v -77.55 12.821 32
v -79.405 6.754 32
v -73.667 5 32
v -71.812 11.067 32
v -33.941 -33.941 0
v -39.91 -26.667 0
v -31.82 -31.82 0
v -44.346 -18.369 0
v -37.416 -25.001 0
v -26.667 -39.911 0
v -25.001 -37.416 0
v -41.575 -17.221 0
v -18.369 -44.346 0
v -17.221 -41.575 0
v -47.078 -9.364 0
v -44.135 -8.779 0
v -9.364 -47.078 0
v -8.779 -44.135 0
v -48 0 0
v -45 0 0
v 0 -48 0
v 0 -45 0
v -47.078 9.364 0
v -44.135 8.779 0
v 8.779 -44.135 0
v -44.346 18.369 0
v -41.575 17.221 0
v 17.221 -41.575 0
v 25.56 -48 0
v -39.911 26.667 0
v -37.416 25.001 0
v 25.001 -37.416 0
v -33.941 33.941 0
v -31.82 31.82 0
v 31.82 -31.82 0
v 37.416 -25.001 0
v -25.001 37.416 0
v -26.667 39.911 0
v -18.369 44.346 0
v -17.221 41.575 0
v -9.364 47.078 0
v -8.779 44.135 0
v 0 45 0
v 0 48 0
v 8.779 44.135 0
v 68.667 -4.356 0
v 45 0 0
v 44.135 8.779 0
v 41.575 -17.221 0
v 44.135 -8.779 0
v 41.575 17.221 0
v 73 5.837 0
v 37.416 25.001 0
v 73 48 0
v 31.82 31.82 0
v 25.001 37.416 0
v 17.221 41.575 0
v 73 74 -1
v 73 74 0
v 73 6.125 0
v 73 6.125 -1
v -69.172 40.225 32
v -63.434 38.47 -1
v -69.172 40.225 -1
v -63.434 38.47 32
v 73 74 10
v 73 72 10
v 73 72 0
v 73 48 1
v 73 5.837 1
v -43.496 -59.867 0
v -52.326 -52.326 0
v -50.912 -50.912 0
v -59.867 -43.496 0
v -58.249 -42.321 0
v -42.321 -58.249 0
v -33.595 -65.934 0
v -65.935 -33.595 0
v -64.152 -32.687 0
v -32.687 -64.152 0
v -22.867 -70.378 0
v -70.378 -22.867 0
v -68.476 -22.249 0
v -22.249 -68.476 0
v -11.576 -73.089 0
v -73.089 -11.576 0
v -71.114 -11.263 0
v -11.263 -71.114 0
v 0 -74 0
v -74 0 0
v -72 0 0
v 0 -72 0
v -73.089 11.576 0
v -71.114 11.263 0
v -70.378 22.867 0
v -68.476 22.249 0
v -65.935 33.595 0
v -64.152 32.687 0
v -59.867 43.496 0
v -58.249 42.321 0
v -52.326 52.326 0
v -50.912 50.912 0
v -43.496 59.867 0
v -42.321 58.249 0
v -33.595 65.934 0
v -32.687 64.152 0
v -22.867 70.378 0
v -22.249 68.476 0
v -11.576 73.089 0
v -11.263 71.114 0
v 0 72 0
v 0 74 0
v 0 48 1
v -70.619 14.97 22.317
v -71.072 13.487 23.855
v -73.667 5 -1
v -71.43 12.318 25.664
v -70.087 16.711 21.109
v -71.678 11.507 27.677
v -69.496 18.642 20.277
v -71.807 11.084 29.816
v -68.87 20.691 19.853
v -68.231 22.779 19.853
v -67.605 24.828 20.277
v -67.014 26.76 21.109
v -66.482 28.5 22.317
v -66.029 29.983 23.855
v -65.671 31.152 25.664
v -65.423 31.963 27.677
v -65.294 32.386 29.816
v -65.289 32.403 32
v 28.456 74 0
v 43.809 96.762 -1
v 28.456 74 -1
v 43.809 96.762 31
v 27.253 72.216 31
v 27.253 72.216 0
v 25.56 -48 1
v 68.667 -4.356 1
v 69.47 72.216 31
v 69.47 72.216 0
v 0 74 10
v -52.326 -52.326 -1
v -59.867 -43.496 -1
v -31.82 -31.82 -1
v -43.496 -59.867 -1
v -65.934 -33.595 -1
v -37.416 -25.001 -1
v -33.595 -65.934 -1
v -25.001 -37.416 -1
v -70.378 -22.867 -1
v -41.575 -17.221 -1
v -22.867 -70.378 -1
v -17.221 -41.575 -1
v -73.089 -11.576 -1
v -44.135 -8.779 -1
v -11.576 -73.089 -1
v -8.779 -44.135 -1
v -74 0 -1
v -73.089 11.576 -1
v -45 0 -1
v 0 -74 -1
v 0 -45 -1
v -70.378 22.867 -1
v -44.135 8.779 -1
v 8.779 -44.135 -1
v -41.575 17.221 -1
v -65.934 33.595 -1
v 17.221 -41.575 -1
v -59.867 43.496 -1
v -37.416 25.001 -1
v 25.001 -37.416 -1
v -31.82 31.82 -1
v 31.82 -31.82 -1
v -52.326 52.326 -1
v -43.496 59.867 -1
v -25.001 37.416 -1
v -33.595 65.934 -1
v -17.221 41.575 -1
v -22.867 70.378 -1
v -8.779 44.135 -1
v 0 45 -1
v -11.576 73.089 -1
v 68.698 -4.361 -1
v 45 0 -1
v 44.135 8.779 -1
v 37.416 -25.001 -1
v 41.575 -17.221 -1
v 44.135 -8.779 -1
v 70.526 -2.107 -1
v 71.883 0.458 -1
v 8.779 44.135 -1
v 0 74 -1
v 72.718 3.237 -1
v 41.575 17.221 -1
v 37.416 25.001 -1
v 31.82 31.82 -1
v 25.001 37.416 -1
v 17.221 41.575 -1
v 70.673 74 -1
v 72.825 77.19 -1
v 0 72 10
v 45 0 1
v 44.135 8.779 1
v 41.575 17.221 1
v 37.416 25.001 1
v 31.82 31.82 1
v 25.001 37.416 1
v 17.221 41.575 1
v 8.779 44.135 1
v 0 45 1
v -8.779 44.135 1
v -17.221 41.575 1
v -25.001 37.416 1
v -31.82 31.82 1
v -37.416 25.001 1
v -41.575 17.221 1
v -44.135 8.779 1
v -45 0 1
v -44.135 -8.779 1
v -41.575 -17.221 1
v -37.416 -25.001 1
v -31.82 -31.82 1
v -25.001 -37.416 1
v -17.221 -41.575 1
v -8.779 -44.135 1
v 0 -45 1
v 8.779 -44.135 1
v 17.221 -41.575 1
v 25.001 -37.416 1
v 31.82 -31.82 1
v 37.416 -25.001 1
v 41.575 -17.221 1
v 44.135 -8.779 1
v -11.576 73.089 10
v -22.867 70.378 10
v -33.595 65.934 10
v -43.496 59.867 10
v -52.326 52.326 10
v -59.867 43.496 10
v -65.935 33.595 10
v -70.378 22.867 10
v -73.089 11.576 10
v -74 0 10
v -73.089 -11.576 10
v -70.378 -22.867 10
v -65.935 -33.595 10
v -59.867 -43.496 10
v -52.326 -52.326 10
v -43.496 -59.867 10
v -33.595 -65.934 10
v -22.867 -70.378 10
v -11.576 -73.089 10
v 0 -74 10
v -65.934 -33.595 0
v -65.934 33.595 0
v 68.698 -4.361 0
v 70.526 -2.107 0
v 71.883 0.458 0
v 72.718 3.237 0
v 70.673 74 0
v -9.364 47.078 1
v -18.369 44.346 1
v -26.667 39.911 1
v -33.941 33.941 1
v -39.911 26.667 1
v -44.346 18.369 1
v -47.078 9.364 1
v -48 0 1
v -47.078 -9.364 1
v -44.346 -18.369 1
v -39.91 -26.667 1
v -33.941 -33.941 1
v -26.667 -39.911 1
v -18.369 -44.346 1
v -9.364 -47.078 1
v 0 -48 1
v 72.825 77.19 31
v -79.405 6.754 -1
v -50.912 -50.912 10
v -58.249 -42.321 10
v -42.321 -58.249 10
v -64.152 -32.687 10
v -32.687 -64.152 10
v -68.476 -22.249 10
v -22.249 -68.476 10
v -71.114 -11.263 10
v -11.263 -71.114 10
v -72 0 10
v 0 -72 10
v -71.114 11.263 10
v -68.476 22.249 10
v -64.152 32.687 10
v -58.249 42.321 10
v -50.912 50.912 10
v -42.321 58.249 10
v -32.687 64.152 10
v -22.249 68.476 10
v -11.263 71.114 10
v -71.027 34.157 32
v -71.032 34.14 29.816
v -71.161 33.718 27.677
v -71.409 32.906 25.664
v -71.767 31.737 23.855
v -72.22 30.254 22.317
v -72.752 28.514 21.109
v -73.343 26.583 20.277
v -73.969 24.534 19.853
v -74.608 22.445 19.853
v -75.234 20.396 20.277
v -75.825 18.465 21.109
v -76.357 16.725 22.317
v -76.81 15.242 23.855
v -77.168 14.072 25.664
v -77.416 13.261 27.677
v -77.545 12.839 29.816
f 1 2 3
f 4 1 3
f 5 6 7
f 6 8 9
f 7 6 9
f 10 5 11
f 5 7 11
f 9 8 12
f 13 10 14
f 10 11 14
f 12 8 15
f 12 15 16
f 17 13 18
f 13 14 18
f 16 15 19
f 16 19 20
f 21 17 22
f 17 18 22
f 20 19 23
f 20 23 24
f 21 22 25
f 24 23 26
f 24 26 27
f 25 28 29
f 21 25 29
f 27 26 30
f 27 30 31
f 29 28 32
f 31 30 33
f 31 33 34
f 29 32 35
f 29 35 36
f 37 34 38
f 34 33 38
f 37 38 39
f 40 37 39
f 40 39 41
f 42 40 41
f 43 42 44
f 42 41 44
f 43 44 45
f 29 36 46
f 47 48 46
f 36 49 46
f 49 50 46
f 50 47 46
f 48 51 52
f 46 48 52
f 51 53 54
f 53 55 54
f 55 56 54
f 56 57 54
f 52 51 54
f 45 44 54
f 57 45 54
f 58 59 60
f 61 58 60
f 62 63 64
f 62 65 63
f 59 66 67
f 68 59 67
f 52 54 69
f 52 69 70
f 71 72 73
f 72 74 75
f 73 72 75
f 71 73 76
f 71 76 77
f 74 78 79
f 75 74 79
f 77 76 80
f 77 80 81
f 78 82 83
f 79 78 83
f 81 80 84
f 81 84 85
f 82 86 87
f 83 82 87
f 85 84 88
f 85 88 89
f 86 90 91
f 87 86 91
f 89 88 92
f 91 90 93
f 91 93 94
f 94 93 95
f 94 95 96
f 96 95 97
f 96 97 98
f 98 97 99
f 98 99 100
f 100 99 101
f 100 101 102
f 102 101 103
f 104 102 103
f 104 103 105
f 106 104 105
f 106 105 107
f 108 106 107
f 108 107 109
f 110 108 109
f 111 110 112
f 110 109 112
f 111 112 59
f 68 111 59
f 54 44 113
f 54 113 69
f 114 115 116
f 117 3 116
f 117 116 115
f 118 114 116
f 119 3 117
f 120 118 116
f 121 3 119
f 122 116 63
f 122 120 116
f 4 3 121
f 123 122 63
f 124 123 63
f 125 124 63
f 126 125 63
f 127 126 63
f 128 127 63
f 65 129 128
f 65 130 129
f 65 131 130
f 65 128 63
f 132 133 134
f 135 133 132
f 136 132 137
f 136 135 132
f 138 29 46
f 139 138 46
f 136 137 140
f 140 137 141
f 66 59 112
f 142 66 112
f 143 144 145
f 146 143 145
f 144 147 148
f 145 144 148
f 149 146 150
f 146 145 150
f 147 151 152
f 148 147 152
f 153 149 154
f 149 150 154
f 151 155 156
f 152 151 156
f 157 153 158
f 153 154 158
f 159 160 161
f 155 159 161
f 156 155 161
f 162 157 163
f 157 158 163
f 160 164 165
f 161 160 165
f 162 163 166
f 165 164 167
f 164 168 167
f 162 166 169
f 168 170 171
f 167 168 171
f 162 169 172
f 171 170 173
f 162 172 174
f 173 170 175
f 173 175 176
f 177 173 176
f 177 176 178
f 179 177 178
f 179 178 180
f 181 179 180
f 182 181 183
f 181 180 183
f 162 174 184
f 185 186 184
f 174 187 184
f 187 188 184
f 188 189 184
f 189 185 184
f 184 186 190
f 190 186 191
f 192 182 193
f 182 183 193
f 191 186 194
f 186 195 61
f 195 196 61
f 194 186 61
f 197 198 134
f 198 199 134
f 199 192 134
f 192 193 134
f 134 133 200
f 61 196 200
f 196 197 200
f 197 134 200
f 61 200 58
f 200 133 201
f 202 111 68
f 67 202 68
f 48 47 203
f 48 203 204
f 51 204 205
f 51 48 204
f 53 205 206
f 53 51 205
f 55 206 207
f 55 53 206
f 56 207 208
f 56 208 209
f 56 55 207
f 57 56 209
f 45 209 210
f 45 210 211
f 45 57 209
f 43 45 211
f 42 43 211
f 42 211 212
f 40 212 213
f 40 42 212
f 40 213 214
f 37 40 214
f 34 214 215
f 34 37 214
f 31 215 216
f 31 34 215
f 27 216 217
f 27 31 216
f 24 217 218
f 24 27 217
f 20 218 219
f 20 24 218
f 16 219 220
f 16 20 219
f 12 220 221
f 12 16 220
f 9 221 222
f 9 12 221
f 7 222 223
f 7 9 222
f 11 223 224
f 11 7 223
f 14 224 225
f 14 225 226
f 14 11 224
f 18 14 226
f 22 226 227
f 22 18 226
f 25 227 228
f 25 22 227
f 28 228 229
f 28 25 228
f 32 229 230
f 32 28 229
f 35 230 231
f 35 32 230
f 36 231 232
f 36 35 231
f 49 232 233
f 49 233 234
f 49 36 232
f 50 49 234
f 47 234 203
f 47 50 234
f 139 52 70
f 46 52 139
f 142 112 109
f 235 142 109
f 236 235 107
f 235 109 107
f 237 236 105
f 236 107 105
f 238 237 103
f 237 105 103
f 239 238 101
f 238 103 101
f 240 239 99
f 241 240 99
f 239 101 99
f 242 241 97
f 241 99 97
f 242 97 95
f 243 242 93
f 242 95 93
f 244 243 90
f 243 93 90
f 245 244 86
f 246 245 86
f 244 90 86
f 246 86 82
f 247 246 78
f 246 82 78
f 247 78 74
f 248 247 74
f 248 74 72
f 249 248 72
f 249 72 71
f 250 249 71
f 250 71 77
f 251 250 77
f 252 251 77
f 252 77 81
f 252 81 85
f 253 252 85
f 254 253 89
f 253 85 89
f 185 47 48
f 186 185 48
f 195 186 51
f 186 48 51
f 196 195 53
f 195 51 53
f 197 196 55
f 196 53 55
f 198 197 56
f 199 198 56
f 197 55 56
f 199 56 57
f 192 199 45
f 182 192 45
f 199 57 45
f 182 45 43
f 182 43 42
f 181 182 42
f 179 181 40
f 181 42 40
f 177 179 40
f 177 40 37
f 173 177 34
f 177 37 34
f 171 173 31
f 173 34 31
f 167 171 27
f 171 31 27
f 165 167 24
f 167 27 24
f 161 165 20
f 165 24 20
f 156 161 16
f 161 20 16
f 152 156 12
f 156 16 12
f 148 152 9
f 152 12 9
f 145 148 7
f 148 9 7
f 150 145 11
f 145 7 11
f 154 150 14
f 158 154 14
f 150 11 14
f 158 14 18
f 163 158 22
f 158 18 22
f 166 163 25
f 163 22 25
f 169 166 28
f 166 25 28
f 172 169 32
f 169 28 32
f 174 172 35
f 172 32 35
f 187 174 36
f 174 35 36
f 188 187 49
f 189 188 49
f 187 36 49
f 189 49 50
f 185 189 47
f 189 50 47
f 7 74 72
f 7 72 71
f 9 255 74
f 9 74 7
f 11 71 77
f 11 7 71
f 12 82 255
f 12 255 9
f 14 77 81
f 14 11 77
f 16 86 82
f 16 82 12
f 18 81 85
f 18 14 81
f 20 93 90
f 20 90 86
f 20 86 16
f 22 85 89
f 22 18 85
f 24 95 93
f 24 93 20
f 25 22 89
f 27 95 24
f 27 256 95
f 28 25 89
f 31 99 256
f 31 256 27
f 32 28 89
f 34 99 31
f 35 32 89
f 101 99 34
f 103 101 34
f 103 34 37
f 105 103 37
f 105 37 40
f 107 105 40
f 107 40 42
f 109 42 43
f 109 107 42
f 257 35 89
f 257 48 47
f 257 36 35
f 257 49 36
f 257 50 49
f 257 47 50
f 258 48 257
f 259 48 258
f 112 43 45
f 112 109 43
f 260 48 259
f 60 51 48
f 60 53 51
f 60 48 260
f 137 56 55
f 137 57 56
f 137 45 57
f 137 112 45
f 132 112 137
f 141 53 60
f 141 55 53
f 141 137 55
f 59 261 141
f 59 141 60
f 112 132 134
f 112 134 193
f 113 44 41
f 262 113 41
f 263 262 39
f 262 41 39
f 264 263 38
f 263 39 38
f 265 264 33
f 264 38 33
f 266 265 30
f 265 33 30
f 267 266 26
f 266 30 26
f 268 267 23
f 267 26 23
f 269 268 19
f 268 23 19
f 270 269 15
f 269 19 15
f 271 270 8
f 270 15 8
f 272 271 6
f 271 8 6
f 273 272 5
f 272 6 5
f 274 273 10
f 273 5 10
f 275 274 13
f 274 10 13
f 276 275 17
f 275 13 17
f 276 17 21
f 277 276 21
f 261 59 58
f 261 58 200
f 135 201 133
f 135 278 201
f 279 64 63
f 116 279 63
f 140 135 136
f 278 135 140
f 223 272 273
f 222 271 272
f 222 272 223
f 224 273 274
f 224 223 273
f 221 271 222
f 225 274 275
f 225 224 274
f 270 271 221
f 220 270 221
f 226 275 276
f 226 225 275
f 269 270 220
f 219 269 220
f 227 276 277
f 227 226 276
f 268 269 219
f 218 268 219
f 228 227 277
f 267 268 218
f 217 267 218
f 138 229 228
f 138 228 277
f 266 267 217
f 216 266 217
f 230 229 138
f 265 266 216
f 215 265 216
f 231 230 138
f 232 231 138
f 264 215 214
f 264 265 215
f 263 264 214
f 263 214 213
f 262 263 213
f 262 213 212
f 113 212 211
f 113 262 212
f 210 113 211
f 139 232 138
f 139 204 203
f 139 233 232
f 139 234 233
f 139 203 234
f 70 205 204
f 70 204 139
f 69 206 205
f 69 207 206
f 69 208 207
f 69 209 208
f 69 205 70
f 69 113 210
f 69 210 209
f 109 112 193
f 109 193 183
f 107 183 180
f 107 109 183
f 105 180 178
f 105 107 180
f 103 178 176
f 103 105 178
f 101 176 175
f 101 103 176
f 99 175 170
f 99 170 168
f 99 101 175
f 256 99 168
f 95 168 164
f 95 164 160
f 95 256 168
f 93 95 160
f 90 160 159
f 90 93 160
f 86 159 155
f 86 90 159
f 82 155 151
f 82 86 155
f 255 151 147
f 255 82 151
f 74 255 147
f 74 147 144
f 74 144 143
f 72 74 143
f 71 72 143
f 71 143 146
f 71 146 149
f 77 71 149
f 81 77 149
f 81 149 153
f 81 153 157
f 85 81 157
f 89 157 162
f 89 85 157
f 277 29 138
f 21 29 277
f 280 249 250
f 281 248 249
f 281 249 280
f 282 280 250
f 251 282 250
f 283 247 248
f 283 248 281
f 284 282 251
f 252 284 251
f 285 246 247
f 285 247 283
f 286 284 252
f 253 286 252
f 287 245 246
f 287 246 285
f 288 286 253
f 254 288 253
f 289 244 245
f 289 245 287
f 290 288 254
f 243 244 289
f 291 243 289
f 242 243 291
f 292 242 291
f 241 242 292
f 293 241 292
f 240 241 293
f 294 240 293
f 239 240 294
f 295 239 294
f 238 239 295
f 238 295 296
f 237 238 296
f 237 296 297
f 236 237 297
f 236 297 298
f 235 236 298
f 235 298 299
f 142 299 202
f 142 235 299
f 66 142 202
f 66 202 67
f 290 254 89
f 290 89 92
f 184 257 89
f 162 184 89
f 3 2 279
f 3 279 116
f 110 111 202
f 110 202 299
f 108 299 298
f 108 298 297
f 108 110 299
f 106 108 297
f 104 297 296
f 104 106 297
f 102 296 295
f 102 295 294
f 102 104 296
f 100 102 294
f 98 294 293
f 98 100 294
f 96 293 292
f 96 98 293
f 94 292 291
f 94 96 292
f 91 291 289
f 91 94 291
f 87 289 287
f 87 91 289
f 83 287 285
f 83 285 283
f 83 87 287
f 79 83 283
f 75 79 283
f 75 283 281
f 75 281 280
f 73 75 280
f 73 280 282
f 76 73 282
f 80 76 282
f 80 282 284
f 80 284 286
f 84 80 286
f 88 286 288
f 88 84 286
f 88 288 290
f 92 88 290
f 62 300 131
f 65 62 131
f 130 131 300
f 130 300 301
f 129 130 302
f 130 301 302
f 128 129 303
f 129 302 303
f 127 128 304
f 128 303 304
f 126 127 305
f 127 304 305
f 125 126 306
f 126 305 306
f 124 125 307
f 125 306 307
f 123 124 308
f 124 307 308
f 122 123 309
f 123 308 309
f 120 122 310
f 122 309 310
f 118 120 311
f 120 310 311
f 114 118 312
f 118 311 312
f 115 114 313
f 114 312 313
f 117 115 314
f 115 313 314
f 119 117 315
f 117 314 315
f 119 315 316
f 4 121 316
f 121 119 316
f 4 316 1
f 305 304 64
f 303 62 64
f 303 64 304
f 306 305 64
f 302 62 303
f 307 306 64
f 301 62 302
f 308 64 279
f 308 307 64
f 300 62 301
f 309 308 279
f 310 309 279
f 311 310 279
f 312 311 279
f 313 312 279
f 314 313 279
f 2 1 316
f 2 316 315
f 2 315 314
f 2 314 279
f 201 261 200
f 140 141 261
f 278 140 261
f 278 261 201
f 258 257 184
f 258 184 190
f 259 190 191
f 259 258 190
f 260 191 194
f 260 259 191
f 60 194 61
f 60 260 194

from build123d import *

# Parameters (mm, degrees)
PAD001_DEPTH      = 10
SKETCH024_R       = 45
PAD002_DEPTH      = 1
PAD004_DEPTH      = 32
PAD004_DEPTH_BACK = 1
SKETCH027_R       = 11.2
POCKET001_DEPTH   = 15.7868758108
SKETCH001_R       = 45
PAD_DEPTH         = 1
PAD005_DEPTH      = 31
PAD005_DEPTH_BACK = 1


with BuildPart() as connector:
    # Sketch002 → Pad001 (new body)
    with BuildSketch(Plane.XY):
        with BuildLine():
            Line((73, 74), (0, 74))
            ThreePointArc((0, 74), (-74.0000491177, 0), (0, -74))
            Line((0, -74), (0, -72))
            ThreePointArc((0, 72), (-72.0000003334, 0), (0, -72))
            Line((0, 72), (73, 72))
            Line((73, 74), (73, 72))
        make_face()
    extrude(amount=PAD001_DEPTH)


with BuildPart() as facestiffener001:
    # Sketch024 → Pad002 (new body)
    with BuildSketch(Plane.XY):
        with BuildLine():
            ThreePointArc((0, 48), (-48, -7.06549e-05), (0.0001413098, -47.9999999999))
            Line((25.5602413098, -47.9999999999), (0.0001413097, -47.9999999999))
            Line((25.5602413098, -47.9999999999), (68.6667827194, -4.3555408869))
            Line((73, 5.8371), (68.6667827194, -4.3555408869))
            Line((73, 48), (73, 5.8371))
            Line((0, 48), (73, 48))
        make_face()
        Circle(SKETCH024_R, mode=Mode.SUBTRACT)
    extrude(amount=PAD002_DEPTH)


with BuildPart() as pocket001:
    # Sketch025 → Pad004 (new body, two sides)
    with BuildSketch(Plane.XY) as pad004_sk:
        Polygon((-69.1718947306, 40.2246535265), (-79.4049043959, 6.7539870678), (-73.6670758601, 4.9997568394), (-63.4340661948, 38.4704232981), align=None)
    extrude(amount=PAD004_DEPTH)
    extrude(pad004_sk.sketch, amount=-PAD004_DEPTH_BACK)

    # Sketch027 → Pocket001 (cut, through all)
    with BuildSketch(Plane(origin=(-74.5056676119, 22.7786685315, 0), x_dir=(-0.2923717047, -0.956304756, 0), z_dir=(-0.956304756, 0.2923717047, 0))):
        with Locations((-0.743122693, 31)):
            Circle(SKETCH027_R)
    extrude(amount=-POCKET001_DEPTH, mode=Mode.SUBTRACT)


with BuildPart() as pad005:
    # Sketch001 → Pad (new body)
    with BuildSketch(Plane.XY):
        with BuildLine():
            Line((73, 74), (0, 74))
            ThreePointArc((0, 74), (-73.9999932033, 0), (0, -74))
            Line((68.6985, -4.3608404621), (0, -74))
            ThreePointArc((68.6985, -4.3608404621), (71.8828289751, 0.4578619517), (73, 6.124587009))
            Line((73, 74), (73, 6.124587009))
        make_face()
        Circle(SKETCH001_R, mode=Mode.SUBTRACT)
    extrude(amount=-PAD_DEPTH)

    # Sketch → Pad005 (new body, two sides)
    with BuildSketch(Plane.XY) as pad005_sk:
        Polygon((27.252644507, 72.2162499408), (69.4702727046, 72.2162499408), (72.8254301255, 77.1904753762), (43.809115086, 96.7622269976), align=None)
    extrude(amount=PAD005_DEPTH)
    extrude(pad005_sk.sketch, amount=-PAD005_DEPTH_BACK)


solid = Compound([connector.part, facestiffener001.part, pocket001.part, pad005.part])
